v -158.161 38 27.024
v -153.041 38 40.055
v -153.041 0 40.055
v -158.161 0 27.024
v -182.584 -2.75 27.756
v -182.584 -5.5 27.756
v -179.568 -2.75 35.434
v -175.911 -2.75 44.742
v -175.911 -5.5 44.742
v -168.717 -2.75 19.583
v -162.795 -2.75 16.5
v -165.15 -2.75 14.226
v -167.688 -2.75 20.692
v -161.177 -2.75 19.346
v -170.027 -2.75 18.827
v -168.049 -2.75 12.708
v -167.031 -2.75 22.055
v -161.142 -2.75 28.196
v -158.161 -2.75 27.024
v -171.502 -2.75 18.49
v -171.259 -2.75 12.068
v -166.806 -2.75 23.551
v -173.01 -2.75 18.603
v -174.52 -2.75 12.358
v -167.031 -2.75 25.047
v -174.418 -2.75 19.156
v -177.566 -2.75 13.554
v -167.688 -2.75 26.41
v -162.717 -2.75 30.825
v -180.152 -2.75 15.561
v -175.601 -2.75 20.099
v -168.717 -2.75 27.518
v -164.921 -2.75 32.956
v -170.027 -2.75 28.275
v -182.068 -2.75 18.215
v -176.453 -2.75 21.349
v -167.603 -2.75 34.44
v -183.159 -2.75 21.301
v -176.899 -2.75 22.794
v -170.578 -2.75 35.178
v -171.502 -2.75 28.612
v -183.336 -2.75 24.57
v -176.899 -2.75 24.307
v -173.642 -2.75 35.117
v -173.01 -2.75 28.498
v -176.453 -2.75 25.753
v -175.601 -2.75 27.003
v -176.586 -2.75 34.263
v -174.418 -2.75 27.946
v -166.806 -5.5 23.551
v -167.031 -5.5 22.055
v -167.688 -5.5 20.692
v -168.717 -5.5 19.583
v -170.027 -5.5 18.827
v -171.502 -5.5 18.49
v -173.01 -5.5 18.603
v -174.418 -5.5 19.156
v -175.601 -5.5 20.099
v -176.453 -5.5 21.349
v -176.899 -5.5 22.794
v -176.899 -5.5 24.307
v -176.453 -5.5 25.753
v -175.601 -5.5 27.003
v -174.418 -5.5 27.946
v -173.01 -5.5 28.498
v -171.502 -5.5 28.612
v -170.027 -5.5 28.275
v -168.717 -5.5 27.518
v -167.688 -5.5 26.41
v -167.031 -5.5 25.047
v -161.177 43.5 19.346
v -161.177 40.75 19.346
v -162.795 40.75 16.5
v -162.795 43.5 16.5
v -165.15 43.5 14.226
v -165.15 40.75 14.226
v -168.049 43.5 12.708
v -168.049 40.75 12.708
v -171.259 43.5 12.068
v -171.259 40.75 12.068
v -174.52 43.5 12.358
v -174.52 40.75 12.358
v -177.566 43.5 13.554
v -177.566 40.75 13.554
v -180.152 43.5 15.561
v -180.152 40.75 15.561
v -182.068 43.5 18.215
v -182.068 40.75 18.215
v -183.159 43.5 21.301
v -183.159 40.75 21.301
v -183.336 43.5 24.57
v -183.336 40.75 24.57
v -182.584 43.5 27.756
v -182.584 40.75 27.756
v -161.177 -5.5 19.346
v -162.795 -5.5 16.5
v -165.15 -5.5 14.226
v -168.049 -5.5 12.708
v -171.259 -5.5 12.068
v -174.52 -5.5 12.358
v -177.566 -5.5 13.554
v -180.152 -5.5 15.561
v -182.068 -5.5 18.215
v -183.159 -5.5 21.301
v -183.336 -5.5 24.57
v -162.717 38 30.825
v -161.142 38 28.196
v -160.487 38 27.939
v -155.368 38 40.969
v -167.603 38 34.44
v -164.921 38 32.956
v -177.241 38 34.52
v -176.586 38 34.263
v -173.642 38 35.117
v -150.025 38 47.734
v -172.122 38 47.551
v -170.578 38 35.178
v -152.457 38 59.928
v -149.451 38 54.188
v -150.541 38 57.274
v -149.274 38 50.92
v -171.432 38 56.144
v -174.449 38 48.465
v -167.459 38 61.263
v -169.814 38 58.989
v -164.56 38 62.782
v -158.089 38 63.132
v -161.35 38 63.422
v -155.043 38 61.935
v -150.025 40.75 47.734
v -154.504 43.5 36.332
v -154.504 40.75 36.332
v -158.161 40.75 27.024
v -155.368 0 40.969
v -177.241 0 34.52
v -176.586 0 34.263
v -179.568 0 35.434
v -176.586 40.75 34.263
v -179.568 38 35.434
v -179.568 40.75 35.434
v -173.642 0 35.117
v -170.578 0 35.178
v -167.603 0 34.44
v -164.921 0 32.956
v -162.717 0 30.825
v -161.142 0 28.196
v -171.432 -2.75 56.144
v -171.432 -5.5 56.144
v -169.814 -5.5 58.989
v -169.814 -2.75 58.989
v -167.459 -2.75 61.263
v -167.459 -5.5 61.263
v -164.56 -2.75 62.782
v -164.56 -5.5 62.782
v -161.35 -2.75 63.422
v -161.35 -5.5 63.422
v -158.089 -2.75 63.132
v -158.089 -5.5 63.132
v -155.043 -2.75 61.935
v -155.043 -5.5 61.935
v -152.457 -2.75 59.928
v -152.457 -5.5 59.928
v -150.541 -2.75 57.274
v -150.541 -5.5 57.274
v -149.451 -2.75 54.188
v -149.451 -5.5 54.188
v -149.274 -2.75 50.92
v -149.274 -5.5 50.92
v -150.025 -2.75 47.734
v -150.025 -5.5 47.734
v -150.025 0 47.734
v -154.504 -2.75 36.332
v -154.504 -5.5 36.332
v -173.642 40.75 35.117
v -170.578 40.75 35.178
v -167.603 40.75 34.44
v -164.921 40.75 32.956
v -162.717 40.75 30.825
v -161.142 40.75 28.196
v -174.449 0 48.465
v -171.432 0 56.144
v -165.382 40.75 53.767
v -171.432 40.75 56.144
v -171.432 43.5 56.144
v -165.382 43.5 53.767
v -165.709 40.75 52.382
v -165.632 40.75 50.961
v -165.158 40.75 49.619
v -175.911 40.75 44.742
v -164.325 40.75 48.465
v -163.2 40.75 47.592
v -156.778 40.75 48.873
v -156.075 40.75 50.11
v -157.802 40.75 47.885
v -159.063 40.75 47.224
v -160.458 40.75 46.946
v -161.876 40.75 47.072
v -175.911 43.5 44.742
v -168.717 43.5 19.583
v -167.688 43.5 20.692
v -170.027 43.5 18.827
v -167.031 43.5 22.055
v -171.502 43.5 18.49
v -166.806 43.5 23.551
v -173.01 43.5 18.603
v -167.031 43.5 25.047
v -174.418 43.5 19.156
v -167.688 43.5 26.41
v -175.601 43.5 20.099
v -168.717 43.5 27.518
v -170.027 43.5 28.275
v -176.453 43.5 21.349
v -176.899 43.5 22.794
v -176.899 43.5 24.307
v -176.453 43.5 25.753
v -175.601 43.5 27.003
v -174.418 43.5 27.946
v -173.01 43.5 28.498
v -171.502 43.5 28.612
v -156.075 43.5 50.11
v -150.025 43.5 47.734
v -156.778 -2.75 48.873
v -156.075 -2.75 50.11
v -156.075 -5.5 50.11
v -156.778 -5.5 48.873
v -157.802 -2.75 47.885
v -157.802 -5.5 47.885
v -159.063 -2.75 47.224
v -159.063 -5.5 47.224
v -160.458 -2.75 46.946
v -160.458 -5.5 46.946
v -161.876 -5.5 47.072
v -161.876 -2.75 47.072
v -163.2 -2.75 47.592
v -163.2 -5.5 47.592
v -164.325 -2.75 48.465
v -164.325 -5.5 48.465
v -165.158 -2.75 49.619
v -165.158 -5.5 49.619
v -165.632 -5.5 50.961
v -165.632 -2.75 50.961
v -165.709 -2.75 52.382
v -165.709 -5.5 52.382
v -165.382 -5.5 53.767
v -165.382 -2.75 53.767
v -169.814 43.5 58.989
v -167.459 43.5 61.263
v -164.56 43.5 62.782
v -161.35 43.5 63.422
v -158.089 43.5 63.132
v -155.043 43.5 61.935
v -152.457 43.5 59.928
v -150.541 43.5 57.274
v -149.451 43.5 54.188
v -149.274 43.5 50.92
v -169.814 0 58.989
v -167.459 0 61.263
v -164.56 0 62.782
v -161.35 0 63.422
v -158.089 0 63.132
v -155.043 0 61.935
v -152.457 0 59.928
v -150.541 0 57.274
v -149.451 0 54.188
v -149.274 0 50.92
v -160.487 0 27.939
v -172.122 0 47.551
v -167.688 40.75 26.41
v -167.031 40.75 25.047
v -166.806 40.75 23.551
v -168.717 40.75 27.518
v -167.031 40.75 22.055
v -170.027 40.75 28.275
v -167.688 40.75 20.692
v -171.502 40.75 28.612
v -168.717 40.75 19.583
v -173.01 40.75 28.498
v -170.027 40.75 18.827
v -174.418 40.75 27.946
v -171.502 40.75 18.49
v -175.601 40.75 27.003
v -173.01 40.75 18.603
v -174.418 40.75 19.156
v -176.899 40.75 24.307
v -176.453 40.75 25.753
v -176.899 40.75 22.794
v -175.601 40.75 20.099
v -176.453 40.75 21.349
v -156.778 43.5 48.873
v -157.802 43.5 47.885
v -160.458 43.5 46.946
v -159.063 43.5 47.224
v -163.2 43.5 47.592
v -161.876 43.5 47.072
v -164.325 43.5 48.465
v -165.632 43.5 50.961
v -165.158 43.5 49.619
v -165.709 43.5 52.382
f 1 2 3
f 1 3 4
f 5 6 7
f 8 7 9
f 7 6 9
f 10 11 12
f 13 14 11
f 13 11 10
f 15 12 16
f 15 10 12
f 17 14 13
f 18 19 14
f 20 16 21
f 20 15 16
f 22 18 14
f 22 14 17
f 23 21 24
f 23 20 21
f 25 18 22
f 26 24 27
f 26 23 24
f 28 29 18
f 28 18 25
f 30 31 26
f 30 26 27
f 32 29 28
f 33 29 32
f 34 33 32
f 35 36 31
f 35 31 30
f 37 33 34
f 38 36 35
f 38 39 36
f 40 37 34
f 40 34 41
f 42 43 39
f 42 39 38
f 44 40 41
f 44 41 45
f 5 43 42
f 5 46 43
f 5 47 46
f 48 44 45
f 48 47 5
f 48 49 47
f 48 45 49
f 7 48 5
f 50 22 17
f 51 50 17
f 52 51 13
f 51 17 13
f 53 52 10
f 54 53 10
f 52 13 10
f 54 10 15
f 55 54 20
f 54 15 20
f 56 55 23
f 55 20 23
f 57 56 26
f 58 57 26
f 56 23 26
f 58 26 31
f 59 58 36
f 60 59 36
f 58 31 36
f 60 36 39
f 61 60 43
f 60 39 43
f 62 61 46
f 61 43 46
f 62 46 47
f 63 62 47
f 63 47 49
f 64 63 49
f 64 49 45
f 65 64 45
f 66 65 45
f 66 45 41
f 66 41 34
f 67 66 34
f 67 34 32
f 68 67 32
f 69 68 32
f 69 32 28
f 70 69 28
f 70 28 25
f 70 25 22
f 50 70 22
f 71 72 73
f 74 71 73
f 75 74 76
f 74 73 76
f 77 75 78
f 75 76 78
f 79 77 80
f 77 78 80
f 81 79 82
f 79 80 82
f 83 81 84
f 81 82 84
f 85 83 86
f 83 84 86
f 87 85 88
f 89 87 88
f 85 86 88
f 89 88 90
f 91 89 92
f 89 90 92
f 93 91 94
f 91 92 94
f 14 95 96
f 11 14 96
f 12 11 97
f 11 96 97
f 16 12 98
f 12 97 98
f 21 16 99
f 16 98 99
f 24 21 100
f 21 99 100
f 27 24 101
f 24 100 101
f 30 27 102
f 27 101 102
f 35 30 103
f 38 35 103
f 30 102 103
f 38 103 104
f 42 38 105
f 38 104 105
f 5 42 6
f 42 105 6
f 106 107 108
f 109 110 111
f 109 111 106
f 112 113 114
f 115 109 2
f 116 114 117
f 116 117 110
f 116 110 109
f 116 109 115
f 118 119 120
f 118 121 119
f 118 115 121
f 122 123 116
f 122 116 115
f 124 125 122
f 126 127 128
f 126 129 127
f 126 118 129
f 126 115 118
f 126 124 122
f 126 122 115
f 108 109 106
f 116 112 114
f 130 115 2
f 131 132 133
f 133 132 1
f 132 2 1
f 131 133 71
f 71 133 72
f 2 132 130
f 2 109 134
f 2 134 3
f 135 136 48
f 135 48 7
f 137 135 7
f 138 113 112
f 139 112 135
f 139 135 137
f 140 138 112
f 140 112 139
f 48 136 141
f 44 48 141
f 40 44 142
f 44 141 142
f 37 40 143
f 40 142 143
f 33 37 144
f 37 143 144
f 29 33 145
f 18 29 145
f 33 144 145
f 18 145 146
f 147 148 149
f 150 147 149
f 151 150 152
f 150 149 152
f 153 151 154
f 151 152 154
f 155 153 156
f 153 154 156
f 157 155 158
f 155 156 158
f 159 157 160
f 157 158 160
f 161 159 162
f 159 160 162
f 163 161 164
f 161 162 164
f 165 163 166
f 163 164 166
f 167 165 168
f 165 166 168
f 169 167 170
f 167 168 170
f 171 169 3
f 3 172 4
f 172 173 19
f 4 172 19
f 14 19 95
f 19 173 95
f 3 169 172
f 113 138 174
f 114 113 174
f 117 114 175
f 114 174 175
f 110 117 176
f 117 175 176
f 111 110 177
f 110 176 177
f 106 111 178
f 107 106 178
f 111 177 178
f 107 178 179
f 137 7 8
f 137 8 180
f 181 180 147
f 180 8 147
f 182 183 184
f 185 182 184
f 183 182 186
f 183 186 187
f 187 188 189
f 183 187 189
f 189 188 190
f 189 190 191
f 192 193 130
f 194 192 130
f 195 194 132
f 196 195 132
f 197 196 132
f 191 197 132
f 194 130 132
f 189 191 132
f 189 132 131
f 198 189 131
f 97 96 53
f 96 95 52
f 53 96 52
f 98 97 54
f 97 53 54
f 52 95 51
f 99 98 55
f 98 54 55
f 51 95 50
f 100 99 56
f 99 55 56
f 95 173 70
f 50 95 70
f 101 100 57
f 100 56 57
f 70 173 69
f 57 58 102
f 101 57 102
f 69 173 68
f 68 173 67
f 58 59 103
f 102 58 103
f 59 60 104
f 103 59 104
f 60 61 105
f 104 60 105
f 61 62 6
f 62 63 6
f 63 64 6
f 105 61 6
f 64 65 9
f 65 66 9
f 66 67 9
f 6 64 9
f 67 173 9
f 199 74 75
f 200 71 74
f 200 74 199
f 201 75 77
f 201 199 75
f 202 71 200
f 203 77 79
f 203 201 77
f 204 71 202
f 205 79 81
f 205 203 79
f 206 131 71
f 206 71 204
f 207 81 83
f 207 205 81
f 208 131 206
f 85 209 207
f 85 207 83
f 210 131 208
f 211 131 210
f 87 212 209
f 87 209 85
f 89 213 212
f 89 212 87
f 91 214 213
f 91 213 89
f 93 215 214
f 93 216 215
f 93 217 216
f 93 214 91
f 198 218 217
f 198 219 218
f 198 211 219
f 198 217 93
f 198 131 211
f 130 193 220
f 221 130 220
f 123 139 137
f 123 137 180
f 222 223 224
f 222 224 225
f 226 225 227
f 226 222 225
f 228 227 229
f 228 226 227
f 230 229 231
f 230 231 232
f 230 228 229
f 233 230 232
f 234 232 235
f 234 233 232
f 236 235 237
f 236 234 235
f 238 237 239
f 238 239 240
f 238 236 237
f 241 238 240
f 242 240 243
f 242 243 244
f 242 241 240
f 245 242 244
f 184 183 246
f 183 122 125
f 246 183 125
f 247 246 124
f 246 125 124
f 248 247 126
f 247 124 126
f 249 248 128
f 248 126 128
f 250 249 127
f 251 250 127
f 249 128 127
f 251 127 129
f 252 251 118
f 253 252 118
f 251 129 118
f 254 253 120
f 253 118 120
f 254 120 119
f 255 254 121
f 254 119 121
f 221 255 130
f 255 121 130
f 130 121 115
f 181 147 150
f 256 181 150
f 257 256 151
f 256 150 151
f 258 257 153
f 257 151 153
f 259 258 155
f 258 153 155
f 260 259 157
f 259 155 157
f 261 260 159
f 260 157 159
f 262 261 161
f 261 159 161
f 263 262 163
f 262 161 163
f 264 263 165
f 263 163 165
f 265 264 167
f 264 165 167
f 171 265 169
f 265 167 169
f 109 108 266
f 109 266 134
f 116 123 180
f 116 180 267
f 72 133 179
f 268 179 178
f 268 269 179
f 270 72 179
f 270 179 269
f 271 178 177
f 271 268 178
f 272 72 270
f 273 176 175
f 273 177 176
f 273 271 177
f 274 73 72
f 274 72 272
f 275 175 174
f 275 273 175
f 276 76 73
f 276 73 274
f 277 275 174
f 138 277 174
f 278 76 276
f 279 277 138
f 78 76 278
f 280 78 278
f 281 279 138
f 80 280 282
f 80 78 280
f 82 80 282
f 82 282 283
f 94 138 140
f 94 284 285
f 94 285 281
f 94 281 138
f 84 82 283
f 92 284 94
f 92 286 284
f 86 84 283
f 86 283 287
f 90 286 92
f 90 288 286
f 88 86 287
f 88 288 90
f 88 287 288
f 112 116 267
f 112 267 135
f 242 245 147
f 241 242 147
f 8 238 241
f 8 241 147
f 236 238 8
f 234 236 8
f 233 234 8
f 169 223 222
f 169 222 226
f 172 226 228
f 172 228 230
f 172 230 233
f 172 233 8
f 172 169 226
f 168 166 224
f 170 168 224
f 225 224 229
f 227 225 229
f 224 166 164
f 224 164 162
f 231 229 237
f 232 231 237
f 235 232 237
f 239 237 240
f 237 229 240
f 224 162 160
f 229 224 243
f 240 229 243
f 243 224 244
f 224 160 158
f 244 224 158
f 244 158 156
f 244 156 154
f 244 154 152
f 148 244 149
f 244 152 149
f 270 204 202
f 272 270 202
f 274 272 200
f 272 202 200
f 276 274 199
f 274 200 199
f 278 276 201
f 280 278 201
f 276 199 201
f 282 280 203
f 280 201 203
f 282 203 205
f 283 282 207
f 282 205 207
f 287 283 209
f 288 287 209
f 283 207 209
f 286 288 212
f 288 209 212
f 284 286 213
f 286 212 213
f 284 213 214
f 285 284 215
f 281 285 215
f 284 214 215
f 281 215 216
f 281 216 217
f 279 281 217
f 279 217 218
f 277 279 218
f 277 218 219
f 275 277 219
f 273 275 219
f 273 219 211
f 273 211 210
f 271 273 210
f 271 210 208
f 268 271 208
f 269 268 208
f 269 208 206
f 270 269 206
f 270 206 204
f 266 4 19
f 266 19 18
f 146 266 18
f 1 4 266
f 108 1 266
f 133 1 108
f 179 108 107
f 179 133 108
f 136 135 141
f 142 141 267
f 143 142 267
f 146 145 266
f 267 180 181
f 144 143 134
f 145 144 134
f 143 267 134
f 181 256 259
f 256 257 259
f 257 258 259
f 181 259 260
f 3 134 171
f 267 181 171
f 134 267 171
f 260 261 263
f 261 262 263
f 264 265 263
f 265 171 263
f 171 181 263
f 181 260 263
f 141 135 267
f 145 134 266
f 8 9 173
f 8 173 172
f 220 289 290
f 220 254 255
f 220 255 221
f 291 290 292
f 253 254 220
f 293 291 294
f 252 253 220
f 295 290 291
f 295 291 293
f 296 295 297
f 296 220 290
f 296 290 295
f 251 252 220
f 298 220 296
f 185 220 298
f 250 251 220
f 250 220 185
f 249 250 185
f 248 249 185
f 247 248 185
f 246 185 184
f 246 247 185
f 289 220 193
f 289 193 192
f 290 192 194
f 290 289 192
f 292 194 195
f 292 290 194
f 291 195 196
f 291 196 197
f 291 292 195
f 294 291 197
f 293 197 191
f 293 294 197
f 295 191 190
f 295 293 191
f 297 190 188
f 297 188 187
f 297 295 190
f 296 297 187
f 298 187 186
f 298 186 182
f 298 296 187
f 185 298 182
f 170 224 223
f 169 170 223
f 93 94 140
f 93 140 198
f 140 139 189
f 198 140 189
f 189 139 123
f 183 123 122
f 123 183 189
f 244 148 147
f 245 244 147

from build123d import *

# Parameters (mm, degrees)
SALIENTE_EXTRUIR1_START   = -2.75
SALIENTE_EXTRUIR1_DEPTH   = 5.5
SALIENTE_EXTRUIR1_2_DEPTH = 2.75
SALIENTE_EXTRUIR2_DEPTH   = 38
SALIENTE_EXTRUIR3_START   = 2.75
SALIENTE_EXTRUIR3_DEPTH   = 2.75
CROQUIS4_W                = 23
CROQUIS4_H                = 43.5
CORTAR_EXTRUIR1_DEPTH     = 8.25
CORTAR_EXTRUIR2_DEPTH     = 2.75
CROQUIS6_W                = 38
CROQUIS6_H                = 22.249999999
CORTAR_EXTRUIR3_DEPTH     = 16.59246817
CROQUIS7_W                = 3.203765914
CROQUIS7_H                = 38
CORTAR_EXTRUIR4_DEPTH     = 8.25
CROQUIS8_W                = 3.203765916
CROQUIS8_H                = 38
CORTAR_EXTRUIR5_DEPTH     = 8.25
CROQUIS9_W                = 14
CROQUIS9_H                = 38
CORTAR_EXTRUIR6_DEPTH     = 0.703765915
CROQUIS10_W               = 14
CROQUIS10_H               = 38
CORTAR_EXTRUIR7_DEPTH     = 0.703765915
SALIENTE_EXTRUIR4_START   = 2.75
SALIENTE_EXTRUIR4_DEPTH   = 2.75
CORTAR_EXTRUIR8_DEPTH     = 2.75
CROQUIS13_W               = 12.249999999
CROQUIS13_H               = 2.75
CORTAR_EXTRUIR9_DEPTH     = 74.034358614
CROQUIS14_W               = 12.249999999
CROQUIS14_H               = 2.75
CORTAR_EXTRUIR10_DEPTH    = 74.034358614
CROQUIS15_W               = 5
CROQUIS15_H               = 2.75
CROQUIS16_W               = 5
CROQUIS16_H               = 2.75
TALADRO1_D                = 10.15
TALADRO1_DEPTH            = 2.75
TALADRO2_D                = 10.15


with BuildPart() as part:
    # Saliente-Extruir1: read off the stored shape, not the designer's step
    # Saliente-Extruir1 outline → Saliente-Extruir1 (new body)
    with BuildSketch(Plane(origin=(0, 40.75, 0), x_dir=(-1, 0, 0), z_dir=(0, 1, 0)).offset(SALIENTE_EXTRUIR1_START)):
        with BuildLine():
            Line((161.177139208, 19.345694485), (182.584423689, 27.755698719))
            Line((182.584423689, 27.755698719), (171.432026769, 56.143619441))
            ThreePointArc((171.432026769, 56.143619441), (156.523382412, 62.642259564), (150.024742289, 47.733615207))
            Line((150.024742289, 47.733615207), (161.177139208, 19.345694485))
        make_face()
    extrude(amount=SALIENTE_EXTRUIR1_DEPTH)

    # Saliente-Extruir1 2 outline → Saliente-Extruir1 2 (add)
    with BuildSketch(Plane(origin=(0, 40.75, 0), x_dir=(-1, 0, 0), z_dir=(0, 1, 0))):
        with BuildLine():
            ThreePointArc((161.177139208, 19.345694485), (176.085783565, 12.847054362), (182.584423687, 27.755698719))
            Line((182.584423687, 27.755698719), (161.177139208, 19.345694485))
        make_face()
    extrude(amount=SALIENTE_EXTRUIR1_2_DEPTH)

    # Croquis2 → Saliente-Extruir2 (add)
    with BuildSketch(Plane.XZ.offset(-38)):
        Polygon((-171.432026768, 56.143619442), (-150.024742288, 47.733615205), (-161.177139209, 19.345694483), (-182.584423689, 27.755698719), align=None)
    extrude(amount=SALIENTE_EXTRUIR2_DEPTH)

    # Croquis3 → Saliente-Extruir3 (add)
    with BuildSketch(Plane.XZ.offset(SALIENTE_EXTRUIR3_START)):
        with BuildLine():
            Line((-182.584423688, 27.755698719), (-171.432026768, 56.143619441))
            ThreePointArc((-171.432026768, 56.143619441), (-156.523382412, 62.642259564), (-150.024742289, 47.733615207))
            Line((-150.024742289, 47.733615207), (-161.177139208, 19.345694485))
            Line((-161.177139208, 19.345694485), (-182.584423688, 27.755698719))
        make_face()
    extrude(amount=-SALIENTE_EXTRUIR3_DEPTH)

    # Croquis4 → Cortar-Extruir1 (cut)
    with BuildSketch(Plane(origin=(-14.965700114, 0, -38.094511116), x_dir=(-0.9307514991056489, 0, 0.3656523580022251), z_dir=(-0.3656523580022251, 0, -0.9307514991056489))):
        with Locations((168.589662745, 19)):
            Rectangle(CROQUIS4_W, CROQUIS4_H)
    extrude(amount=-CORTAR_EXTRUIR1_DEPTH, mode=Mode.SUBTRACT)

    # Croquis5 → Cortar-Extruir2 (cut)
    with BuildSketch(Plane(origin=(0, 40.75, 0), x_dir=(1, 0, 0), z_dir=(0, 1, 0))):
        with BuildLine():
            Line((-161.142417183, -28.195858914), (-176.585881806, -34.262934025))
            ThreePointArc((-176.585881806, -34.262934025), (-167.602648859, -34.440489141), (-161.142417183, -28.195858914))
        make_face()
    extrude(amount=-CORTAR_EXTRUIR2_DEPTH, mode=Mode.SUBTRACT)

    # Croquis6 → Cortar-Extruir3 (cut)
    with BuildSketch(Plane(origin=(-149.193349022, 0, 58.611670162), x_dir=(0, 1, 0), z_dir=(0.9307514991056486, 0, -0.3656523580022258))):
        with Locations((19, -21.553766865)):
            Rectangle(CROQUIS6_W, CROQUIS6_H)
    extrude(amount=-CORTAR_EXTRUIR3_DEPTH, mode=Mode.SUBTRACT)

    # Croquis7 → Cortar-Extruir4 (cut)
    with BuildSketch(Plane(origin=(-3.8133032, 0, -9.706590403), x_dir=(0.9307514990825102, 0, -0.36565235806112356), z_dir=(0.36565235806112356, 0, 0.9307514990825102))):
        with Locations((-158.691545702, 19)):
            Rectangle(CROQUIS7_W, CROQUIS7_H)
    extrude(amount=-CORTAR_EXTRUIR4_DEPTH, mode=Mode.SUBTRACT)

    # Croquis8 → Cortar-Extruir5 (cut)
    with BuildSketch(Plane(origin=(-3.8133032, 0, -9.706590403), x_dir=(0.9307514990825102, 0, -0.36565235806112356), z_dir=(0.36565235806112356, 0, 0.9307514990825102))):
        with Locations((-178.487779787, 19)):
            Rectangle(CROQUIS8_W, CROQUIS8_H)
    extrude(amount=-CORTAR_EXTRUIR5_DEPTH, mode=Mode.SUBTRACT)

    # Croquis9 → Cortar-Extruir6 (cut)
    with BuildSketch(Plane(origin=(-164.636813645, 0, 64.678745273), x_dir=(-0.3656523580022247, 0, -0.930751499105649), z_dir=(0.930751499105649, 1.4355340193330324e-15, -0.3656523580022247))):
        with Locations((25.678766864, 19)):
            Rectangle(CROQUIS9_W, CROQUIS9_H)
    extrude(amount=-CORTAR_EXTRUIR6_DEPTH, mode=Mode.SUBTRACT)

    # Croquis10 → Cortar-Extruir7 (cut)
    with BuildSketch(Plane(origin=(-149.193349022, 0, 58.611670162), x_dir=(0.3656523580022248, 0, 0.930751499105649), z_dir=(-0.930751499105649, -1.4355340193330322e-15, 0.3656523580022248))):
        with Locations((-25.678766864, 19)):
            Rectangle(CROQUIS10_W, CROQUIS10_H)
    extrude(amount=-CORTAR_EXTRUIR7_DEPTH, mode=Mode.SUBTRACT)

    # Croquis11 → Saliente-Extruir4 (add)
    with BuildSketch(Plane.XZ.offset(2.75).offset(SALIENTE_EXTRUIR4_START)):
        with BuildLine():
            Line((-150.024742289, 47.733615207), (-161.177139208, 19.345694485))
            ThreePointArc((-161.177139208, 19.345694485), (-176.085783565, 12.847054362), (-182.584423687, 27.755698719))
            Line((-182.584423687, 27.755698719), (-171.432026769, 56.143619441))
            ThreePointArc((-171.432026769, 56.143619441), (-156.523382412, 62.642259564), (-150.024742289, 47.733615207))
        make_face()
    extrude(amount=-SALIENTE_EXTRUIR4_DEPTH)

    # Croquis12 → Cortar-Extruir8 (cut)
    with BuildSketch(Plane(origin=(0, 0, 0), x_dir=(-1, 0, 0), z_dir=(0, 1, 0))):
        with BuildLine():
            Line((161.142417183, 28.195858914), (176.585881806, 34.262934025))
            ThreePointArc((176.585881806, 34.262934025), (167.602648859, 34.440489141), (161.142417183, 28.195858914))
        make_face()
    extrude(amount=-CORTAR_EXTRUIR8_DEPTH, mode=Mode.SUBTRACT)

    # Croquis13 → Cortar-Extruir9 (cut, through all)
    with BuildSketch(Plane(origin=(-146.211439094, 0, 57.440205601), x_dir=(-0.36565235800222584, 0, -0.9307514991056486), z_dir=(0.9307514991056486, 0, -0.36565235800222584))):
        with Locations((16.553766864, -4.125)):
            Rectangle(CROQUIS13_W, CROQUIS13_H)
    extrude(amount=-CORTAR_EXTRUIR9_DEPTH, mode=Mode.SUBTRACT)

    # Croquis14 → Cortar-Extruir10 (cut, through all)
    with BuildSketch(Plane(origin=(-146.211439094, 0, 57.440205601), x_dir=(-0.36565235800222584, 0, -0.9307514991056486), z_dir=(0.9307514991056486, 0, -0.36565235800222584))):
        with Locations((16.553766864, 42.125)):
            Rectangle(CROQUIS14_W, CROQUIS14_H)
    extrude(amount=-CORTAR_EXTRUIR10_DEPTH, mode=Mode.SUBTRACT)

    # Croquis15 → Revolución1 (revolve)
    with BuildSketch(Plane(origin=(0, 0, 51.938617325), x_dir=(-1, 0, 0), z_dir=(0, 0, -1))):
        with Locations((158.228384529, -4.125)):
            Rectangle(CROQUIS15_W, CROQUIS15_H)
    revolve(axis=Axis((-160.728384529, -5.5, 51.938617325), (0, 1, 0)))

    # Croquis16 → Revolución2 (revolve)
    with BuildSketch(Plane(origin=(0, 0, 51.938617325), x_dir=(-1, 0, 0), z_dir=(0, 0, -1))):
        with Locations((158.228384529, 42.125)):
            Rectangle(CROQUIS16_W, CROQUIS16_H)
    revolve(axis=Axis((-160.728384529, 40.75, 51.938617325), (0, 1, 0)))

    # Taladro1
    with Locations(Plane(origin=(0, -5.5, 0), x_dir=(-1, 0, 0), z_dir=(0, -1, 0))):
        with Locations((171.880781448, -23.550696602)):
            Hole(TALADRO1_D / 2, depth=TALADRO1_DEPTH)

    # Taladro2 (through all)
    with Locations(Plane(origin=(0, 40.75, 0), x_dir=(-1, 0, 0), z_dir=(0, -1, 0))):
        with Locations((171.880781448, -23.550696602)):
            Hole(TALADRO2_D / 2)


solid = part.part
